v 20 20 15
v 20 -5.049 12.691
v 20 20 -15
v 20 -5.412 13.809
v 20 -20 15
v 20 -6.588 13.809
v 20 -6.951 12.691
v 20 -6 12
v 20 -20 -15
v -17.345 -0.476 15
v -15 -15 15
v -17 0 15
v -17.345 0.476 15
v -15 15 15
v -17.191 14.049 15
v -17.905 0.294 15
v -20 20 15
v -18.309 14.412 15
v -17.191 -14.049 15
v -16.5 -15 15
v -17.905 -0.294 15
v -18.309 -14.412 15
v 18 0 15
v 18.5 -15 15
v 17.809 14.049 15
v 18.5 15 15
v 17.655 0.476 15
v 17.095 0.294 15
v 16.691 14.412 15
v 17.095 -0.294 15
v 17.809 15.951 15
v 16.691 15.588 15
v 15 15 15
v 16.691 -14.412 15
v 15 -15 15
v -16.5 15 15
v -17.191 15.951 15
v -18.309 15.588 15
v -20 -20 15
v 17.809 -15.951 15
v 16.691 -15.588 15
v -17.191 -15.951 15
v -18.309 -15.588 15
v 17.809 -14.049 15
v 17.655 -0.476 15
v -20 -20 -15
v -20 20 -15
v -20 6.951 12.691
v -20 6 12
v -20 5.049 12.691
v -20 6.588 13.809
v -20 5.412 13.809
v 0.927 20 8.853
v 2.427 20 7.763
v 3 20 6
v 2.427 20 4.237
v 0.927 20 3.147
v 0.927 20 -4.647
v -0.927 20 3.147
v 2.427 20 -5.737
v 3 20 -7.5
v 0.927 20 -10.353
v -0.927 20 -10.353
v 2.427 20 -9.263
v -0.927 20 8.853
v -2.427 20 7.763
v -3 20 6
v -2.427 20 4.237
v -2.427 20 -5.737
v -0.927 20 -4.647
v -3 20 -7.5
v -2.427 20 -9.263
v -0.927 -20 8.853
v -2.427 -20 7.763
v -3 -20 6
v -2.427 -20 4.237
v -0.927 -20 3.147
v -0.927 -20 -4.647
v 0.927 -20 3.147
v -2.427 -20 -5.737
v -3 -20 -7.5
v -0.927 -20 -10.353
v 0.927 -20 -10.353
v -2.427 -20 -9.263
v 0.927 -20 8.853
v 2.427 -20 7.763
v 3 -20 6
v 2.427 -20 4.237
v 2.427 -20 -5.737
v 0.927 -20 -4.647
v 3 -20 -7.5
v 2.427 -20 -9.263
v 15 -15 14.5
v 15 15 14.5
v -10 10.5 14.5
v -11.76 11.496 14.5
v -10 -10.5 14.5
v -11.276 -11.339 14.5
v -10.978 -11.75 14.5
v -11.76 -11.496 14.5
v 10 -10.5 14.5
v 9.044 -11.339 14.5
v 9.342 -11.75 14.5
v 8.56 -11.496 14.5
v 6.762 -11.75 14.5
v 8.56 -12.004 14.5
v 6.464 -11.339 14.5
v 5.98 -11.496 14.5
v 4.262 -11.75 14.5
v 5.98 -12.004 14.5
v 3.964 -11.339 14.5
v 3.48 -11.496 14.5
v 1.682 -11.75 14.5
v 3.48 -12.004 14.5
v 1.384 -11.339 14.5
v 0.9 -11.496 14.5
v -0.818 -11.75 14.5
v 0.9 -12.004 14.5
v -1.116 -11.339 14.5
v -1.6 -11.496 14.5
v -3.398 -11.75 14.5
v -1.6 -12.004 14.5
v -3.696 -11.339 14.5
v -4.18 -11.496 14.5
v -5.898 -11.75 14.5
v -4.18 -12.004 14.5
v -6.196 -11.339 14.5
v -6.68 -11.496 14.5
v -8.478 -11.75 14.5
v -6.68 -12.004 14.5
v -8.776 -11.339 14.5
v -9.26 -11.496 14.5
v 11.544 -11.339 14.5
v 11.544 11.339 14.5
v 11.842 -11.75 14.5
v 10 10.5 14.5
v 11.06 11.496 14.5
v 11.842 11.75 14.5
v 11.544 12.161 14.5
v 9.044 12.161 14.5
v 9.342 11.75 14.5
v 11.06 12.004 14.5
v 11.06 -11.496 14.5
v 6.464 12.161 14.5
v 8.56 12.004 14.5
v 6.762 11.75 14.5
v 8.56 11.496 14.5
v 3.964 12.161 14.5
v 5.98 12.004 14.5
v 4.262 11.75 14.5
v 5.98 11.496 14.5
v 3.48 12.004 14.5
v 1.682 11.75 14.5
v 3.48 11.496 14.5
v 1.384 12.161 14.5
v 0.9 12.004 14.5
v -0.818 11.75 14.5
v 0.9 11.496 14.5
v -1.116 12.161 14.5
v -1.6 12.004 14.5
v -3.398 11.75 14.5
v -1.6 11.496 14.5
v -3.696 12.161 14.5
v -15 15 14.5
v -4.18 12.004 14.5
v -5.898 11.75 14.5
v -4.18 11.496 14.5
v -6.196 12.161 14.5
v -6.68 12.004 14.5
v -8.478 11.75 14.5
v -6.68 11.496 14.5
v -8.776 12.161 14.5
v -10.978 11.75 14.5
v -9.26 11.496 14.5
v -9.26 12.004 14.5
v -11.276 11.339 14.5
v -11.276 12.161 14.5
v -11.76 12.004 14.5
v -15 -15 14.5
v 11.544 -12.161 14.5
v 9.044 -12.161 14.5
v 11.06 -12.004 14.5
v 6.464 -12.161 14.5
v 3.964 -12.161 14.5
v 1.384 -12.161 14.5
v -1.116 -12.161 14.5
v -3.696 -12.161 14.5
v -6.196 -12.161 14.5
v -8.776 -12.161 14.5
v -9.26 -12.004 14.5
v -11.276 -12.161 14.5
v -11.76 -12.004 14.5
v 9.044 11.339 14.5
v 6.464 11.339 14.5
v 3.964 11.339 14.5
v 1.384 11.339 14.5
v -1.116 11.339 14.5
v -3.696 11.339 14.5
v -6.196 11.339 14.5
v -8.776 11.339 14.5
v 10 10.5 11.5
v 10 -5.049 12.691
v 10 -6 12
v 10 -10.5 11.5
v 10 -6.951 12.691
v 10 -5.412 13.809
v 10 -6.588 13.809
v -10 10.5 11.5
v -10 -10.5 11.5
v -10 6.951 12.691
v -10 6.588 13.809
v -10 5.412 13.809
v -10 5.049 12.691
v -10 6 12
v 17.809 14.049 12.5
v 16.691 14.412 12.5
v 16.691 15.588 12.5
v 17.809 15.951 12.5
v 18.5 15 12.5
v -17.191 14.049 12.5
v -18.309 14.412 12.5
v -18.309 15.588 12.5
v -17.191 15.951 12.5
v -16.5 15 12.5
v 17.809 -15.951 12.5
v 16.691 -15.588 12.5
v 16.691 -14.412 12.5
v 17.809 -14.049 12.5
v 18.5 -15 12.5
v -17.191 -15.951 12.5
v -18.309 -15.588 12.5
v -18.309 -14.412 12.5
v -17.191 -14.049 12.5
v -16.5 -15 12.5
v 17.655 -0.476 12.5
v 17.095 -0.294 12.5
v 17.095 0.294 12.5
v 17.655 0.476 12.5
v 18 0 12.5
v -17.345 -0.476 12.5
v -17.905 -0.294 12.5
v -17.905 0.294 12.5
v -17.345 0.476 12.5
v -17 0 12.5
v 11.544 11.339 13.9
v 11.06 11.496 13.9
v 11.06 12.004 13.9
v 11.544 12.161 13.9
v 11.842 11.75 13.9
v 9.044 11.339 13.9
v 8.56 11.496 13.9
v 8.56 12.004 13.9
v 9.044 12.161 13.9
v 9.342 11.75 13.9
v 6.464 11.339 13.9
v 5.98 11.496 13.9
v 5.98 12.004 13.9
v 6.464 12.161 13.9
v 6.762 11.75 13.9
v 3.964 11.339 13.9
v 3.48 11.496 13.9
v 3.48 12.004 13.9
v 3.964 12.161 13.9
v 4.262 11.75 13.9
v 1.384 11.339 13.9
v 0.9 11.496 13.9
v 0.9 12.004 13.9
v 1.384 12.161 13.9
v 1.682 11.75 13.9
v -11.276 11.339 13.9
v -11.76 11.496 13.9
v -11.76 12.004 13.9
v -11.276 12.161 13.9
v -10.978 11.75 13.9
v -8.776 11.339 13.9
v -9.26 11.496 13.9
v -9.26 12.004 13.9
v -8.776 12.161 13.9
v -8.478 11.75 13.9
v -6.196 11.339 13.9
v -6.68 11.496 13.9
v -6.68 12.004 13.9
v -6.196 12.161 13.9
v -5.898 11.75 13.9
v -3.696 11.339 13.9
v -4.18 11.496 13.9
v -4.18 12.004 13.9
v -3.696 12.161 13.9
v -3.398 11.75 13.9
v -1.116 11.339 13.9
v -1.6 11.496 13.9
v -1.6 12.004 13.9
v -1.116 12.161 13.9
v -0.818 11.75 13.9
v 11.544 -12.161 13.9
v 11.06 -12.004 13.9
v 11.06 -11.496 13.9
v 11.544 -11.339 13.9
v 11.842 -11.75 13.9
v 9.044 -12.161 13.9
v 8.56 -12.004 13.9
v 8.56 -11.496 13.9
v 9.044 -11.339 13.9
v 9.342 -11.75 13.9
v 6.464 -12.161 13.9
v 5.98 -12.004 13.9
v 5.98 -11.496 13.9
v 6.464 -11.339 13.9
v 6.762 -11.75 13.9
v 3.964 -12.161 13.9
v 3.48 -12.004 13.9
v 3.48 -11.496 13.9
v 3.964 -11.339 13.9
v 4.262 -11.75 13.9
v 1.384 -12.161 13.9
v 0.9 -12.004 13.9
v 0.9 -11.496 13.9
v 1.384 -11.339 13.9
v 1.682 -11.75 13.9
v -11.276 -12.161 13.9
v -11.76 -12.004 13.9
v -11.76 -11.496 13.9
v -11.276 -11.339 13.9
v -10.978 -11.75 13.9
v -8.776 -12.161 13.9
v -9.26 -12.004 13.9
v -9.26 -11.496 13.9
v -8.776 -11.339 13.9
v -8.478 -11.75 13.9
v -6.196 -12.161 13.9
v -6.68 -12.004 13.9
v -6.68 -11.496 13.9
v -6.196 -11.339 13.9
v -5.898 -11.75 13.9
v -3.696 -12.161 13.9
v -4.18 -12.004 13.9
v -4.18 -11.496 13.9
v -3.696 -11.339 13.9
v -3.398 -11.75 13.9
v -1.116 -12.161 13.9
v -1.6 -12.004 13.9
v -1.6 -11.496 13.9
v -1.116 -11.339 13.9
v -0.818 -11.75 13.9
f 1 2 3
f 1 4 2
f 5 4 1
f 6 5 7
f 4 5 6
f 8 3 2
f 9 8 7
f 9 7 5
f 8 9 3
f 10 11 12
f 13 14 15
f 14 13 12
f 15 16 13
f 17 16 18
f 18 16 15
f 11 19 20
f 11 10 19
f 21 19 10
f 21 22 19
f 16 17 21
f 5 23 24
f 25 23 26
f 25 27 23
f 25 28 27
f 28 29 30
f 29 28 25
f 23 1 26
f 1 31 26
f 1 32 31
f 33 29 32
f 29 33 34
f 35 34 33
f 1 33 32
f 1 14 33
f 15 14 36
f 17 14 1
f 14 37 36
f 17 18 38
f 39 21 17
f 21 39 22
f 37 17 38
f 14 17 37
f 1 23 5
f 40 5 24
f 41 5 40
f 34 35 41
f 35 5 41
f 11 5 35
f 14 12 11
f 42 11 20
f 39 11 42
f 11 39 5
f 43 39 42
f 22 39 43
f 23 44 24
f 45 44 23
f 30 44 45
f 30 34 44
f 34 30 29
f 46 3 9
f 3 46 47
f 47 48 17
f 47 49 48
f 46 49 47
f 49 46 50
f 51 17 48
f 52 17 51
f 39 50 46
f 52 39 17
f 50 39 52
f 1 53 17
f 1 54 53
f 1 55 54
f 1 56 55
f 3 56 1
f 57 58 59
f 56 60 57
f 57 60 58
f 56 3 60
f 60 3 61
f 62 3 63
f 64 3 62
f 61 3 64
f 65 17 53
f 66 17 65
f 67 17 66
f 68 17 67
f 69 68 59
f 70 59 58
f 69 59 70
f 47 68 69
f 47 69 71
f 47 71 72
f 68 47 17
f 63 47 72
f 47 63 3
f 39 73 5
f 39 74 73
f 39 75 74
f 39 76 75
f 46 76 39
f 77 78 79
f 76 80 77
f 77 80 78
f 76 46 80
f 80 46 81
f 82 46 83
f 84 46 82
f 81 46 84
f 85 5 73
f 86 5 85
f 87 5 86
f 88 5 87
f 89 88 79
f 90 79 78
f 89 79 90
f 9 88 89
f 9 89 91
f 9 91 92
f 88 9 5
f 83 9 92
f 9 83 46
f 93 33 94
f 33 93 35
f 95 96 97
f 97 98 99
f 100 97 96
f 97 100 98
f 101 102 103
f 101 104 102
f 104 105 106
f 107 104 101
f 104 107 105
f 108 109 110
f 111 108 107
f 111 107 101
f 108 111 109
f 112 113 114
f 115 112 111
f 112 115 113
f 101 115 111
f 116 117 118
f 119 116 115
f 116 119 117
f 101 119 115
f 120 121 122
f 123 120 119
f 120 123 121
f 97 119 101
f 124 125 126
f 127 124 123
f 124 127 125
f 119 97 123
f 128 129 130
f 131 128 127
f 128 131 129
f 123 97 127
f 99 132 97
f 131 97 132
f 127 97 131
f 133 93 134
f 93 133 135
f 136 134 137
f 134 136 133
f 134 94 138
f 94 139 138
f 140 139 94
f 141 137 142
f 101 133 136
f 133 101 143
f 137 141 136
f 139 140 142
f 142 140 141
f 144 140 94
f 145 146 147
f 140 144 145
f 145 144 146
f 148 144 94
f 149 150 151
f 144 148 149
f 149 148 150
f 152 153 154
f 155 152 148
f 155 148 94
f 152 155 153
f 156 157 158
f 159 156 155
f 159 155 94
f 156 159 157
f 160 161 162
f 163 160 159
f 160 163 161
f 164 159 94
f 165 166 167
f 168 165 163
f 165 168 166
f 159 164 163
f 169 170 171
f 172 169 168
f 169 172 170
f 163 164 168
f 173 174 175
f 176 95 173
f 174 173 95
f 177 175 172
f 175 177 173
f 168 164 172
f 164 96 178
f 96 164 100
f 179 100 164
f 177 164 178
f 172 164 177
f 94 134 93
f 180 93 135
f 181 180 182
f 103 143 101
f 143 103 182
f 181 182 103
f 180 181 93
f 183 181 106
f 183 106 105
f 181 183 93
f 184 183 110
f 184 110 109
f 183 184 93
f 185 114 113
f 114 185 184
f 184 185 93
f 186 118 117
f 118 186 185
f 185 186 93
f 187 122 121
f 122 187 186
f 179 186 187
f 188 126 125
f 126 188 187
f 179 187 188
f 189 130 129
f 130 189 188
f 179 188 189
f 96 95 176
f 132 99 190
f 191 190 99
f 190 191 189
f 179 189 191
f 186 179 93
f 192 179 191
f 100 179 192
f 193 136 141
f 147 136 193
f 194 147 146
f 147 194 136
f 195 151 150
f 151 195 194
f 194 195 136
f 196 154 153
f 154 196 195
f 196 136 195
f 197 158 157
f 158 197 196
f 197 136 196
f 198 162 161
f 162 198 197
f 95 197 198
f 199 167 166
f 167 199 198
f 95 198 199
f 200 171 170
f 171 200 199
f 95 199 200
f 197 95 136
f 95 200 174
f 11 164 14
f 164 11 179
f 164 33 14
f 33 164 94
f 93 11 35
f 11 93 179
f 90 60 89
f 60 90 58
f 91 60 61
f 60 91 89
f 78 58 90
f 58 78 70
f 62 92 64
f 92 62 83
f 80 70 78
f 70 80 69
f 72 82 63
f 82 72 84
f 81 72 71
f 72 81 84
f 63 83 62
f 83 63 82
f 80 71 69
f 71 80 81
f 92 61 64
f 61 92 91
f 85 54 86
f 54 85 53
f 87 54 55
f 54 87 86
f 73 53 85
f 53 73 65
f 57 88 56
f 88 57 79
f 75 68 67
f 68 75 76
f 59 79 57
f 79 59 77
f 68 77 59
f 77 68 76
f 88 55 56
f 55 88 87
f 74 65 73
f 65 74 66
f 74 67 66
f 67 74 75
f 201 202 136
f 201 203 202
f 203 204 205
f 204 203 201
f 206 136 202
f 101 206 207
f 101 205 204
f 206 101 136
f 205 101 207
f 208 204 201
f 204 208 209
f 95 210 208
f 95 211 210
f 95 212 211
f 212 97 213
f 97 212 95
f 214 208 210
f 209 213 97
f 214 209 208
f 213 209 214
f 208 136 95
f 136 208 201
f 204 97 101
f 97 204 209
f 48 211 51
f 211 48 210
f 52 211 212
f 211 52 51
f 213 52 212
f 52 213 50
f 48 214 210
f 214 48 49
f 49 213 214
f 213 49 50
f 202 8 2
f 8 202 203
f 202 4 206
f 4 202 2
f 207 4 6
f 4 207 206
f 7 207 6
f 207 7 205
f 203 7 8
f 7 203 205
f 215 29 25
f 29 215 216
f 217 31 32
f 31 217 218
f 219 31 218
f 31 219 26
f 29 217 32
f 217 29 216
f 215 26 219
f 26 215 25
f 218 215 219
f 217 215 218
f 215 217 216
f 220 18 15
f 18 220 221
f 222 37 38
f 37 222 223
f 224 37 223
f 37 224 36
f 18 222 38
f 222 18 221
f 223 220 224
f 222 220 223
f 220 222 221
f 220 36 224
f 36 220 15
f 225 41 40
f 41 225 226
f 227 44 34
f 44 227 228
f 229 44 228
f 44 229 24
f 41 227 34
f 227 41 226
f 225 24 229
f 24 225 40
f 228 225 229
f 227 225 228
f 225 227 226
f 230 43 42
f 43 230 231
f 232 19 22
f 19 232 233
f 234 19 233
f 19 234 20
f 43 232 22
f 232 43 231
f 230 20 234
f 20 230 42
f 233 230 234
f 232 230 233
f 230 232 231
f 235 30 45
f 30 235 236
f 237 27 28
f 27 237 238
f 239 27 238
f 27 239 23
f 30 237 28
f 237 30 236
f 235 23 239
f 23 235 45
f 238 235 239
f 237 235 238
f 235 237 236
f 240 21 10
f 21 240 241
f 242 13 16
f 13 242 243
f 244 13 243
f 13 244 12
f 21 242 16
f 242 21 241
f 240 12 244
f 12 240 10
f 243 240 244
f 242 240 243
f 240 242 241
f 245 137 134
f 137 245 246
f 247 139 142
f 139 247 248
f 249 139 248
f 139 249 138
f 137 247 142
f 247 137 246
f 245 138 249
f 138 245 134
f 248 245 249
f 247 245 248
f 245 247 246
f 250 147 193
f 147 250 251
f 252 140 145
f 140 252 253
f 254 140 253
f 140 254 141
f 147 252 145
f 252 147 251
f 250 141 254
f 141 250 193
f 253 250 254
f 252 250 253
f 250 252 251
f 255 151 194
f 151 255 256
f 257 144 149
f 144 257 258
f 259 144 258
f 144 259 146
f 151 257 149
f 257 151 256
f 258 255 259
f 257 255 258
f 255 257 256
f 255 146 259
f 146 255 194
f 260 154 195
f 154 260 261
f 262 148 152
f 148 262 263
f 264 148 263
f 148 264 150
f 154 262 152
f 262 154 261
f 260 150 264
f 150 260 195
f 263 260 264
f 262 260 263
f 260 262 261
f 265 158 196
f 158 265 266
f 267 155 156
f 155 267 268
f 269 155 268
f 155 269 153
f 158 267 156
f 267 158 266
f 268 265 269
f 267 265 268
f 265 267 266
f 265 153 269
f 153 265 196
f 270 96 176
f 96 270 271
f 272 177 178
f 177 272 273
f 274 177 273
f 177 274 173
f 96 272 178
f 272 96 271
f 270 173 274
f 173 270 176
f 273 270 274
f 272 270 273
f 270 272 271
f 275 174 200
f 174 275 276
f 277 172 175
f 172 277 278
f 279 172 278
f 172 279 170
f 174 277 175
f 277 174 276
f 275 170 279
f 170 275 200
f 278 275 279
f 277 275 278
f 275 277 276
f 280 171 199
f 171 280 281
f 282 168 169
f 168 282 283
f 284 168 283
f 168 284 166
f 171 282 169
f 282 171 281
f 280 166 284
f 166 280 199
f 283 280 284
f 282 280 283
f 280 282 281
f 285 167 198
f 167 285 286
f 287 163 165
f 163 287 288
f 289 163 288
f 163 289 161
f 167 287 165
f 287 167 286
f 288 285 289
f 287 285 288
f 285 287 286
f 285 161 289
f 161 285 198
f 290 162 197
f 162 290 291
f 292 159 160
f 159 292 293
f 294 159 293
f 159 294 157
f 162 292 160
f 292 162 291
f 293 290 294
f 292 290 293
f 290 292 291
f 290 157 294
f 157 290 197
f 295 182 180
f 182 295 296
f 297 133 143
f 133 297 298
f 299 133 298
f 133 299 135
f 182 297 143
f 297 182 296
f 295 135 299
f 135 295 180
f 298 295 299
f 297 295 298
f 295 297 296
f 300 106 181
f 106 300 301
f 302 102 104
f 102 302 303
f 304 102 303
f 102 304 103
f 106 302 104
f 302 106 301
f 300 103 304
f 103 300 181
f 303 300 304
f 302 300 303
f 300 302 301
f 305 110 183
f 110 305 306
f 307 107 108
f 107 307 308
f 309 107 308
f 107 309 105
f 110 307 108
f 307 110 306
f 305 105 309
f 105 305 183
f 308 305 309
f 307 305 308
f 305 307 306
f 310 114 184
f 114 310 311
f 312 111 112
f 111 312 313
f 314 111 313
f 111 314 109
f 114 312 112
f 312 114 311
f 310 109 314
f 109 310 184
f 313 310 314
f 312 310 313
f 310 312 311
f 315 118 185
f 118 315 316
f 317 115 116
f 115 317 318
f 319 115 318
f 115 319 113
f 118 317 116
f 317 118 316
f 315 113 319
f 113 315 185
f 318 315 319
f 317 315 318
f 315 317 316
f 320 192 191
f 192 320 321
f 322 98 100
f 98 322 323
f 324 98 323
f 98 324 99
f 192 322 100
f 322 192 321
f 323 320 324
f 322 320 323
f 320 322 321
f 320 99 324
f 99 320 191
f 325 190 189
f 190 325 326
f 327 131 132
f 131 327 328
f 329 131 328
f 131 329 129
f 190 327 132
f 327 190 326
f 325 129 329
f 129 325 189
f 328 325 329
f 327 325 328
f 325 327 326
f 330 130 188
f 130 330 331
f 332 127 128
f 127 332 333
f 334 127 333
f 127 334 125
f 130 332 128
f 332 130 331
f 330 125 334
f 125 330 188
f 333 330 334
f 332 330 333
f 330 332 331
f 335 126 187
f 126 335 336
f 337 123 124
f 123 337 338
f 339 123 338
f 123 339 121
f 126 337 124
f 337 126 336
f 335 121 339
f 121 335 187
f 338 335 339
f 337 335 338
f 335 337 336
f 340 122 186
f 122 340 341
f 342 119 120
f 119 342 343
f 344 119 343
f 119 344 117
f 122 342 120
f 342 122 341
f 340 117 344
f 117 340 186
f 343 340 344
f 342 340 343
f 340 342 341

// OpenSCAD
//Substrate holder v2


module substrate_holder(x1,y1,z1, s_d)
{
    
    //substrate dimensions
    x=30;
    y=30;
    z=1.1;
    d=0.8641;
    
    //negative y
    difference(){
    difference(){
    difference(){
    difference(){
    difference(){
    difference(){
    difference(){
    difference(){
    difference(){
    difference(){
       // positive y 
    difference(){
    difference(){
    difference(){
    difference(){
    difference(){
    difference(){
    difference(){
    difference(){
    difference(){
    difference(){
    
    //negative y
    //difference(){
    //difference(){
    //difference(){
    //difference(){
    //difference(){
    //difference(){
    //difference(){
    //difference(){
    //difference(){
    //difference(){
       // positive y 
    //difference(){
    //difference(){
    //difference(){
    //difference(){
    //difference(){
    //difference(){
    //difference(){
    //difference(){
    //difference(){
    //difference(){
        
        //components
            
            difference(){
            difference(){
            difference(){
            difference(){
            difference(){
            difference(){
            difference(){
            difference(){
            difference(){
            difference(){
            difference(){
            difference(){
            //difference(){
        cube ([x1,y1,z1], center = true);
        
        //substrate outline
        translate([0,0,z1/2]) 
        cube([x,y,1], center = true);}
            // cartridge heater
                translate([0,0,-z1/4])
                rotate([90,0,0])
                cylinder(r=3, h=x1+1, center = true);}
                
             // temp sensor
                translate([0,0,6])
                rotate([90,0,0])
                cylinder(r=3, h=x1+1, center = true);} 
             // air flow 
              
              translate([0,0,z1/2])
              cube([x-10,y-9,7], center =true);}
              
              translate([-15,6,z1/2-2])
              rotate([0,90,0])
              cylinder(r=1, h=x1+1, center = true);}
              
              translate([15,-6,z1/2-2])
              rotate([0,90,0])
              cylinder(r=1, h=x1+1, center = true);}
             
              
                
            
                
             //bracket
             translate([17.5,y/2,z1/2])
             cylinder(r=1, h=5, center =true);}
             
             translate([-17.5,y/2,z1/2])
             cylinder(r=1, h=5, center =true);}
             
             translate([17.5,-(y/2),z1/2])
             cylinder(r=1, h=5, center =true);}
             
             translate([-17.5,-(y/2),z1/2])
             cylinder(r=1, h=5, center =true);}
             
             //bracket guide pins
             translate([17.5,0,z1/2])
             cylinder(r=0.5, h=5, center =true);}
             translate([-17.5,0,z1/2])
             cylinder(r=0.5, h=5, center =true);}
             
                
                
                
                // gap for heater
                //translate([0,0,0])
                //rotate([0,0,0])
                //cylinder(r=8, h=x1+1, center = true);} 
              
        //sideways oriented holes        
        // positive y posiitve x   
////        translate([x/2-3.59,y/2+1,z1/2])
////             rotate([90,0,0])
////        cylinder(r=d/2, h=9, center =true);}
////        
////        translate([x/2-6.09,y/2+1,z1/2])
////         rotate([90,0,0])
////        cylinder(r=d/2, h=9, center =true);}
////        
////          translate([x/2-8.67,y/2+1,z1/2])
////         rotate([90,0,0])
////        cylinder(r=d/2, h=9, center =true);}
////        
////        translate([x/2-11.17,y/2+1,z1/2])
////         rotate([90,0,0])
////        cylinder(r=d/2, h=9, center =true);}
////        
////        translate([x/2-13.75,y/2+1,z1/2])
////         rotate([90,0,0])
////        cylinder(r=d/2, h=9, center =true);}
////        
////        //positive y negative x
////        translate([-(x/2-3.59),y/2+1,z1/2])
////         rotate([90,0,0])
////        cylinder(r=d/2, h=9, center =true);}
////        
////        translate([-(x/2-6.09),y/2+1,z1/2])
////         rotate([90,0,0])
////        cylinder(r=d/2, h=9, center =true);}
////        
////          translate([-(x/2-8.67),y/2+1,z1/2])
////         rotate([90,0,0])
////        cylinder(r=d/2, h=9, center =true);}
////        
////        translate([-(x/2-11.17),y/2+1,z1/2])
////         rotate([90,0,0])
////        cylinder(r=d/2, h=9, center =true);}
////        
////        translate([-(x/2-13.75),y/2+1,z1/2])
////         rotate([90,0,0])
////        cylinder(r=d/2, h=9, center =true);}
////        
////         // negative y positve x   
////        translate([x/2-3.59,-(y/2+1),z1/2])
////         rotate([90,0,0])
////        cylinder(r=d/2, h=9, center =true);}
////        
////        translate([x/2-6.09,-(y/2+1),z1/2])
////         rotate([90,0,0])
////        cylinder(r=d/2, h=9, center =true);}
////        
////          translate([x/2-8.67,-(y/2+1),z1/2])
////         rotate([90,0,0])
////        cylinder(r=d/2, h=9, center =true);}
////        
////        translate([x/2-11.17,-(y/2+1),z1/2])
////         rotate([90,0,0])
////        cylinder(r=d/2, h=9, center =true);}
////        
////        translate([x/2-13.75,-(y/2+1),z1/2])
////         rotate([90,0,0])
////        cylinder(r=d/2, h=9, center =true);}
////        
////        //negative y negative x
////        translate([-(x/2-3.59),-(y/2+1),z1/2])
////         rotate([90,0,0])
////        cylinder(r=d/2, h=9, center =true);}
////        
////        translate([-(x/2-6.09),-(y/2+1),z1/2])
////         rotate([90,0,0])
////        cylinder(r=d/2, h=9, center =true);}
////        
////          translate([-(x/2-8.67),-(y/2+1),z1/2])
////         rotate([90,0,0])
////        cylinder(r=d/2, h=9, center =true);}
////        
////        translate([-(x/2-11.17),-(y/2+1),z1/2])
////         rotate([90,0,0])
////        cylinder(r=d/2, h=9, center =true);}
////        
////        translate([-(x/2-13.75),-(y/2+1),z1/2])
////         rotate([90,0,0])
////        cylinder(r=d/2, h=9, center =true);}
    
    
        
//Vertical oriented holes        
         // positive y posiitve x   
        translate([x/2-3.59,y/2-3.25,z1/2])
        cylinder(r=d/2, h=z+1.1, center =true);}
        
        translate([x/2-6.09,y/2-3.25,z1/2])
        cylinder(r=d/2, h=z+1.1, center =true);}
        
          translate([x/2-8.67,y/2-3.25,z1/2])
        cylinder(r=d/2, h=z+1.1, center =true);}
        
        translate([x/2-11.17,y/2-3.25,z1/2])
        cylinder(r=d/2, h=z+1.1, center =true);}
        
        translate([x/2-13.75,y/2-3.25,z1/2])
        cylinder(r=d/2, h=z+1.1, center =true);}
        
        //positive y negative x
        translate([-(x/2-3.59),y/2-3.25,z1/2])
        cylinder(r=d/2, h=z+1.1, center =true);}
        
        translate([-(x/2-6.09),y/2-3.25,z1/2])
        cylinder(r=d/2, h=z+1.1, center =true);}
        
          translate([-(x/2-8.67),y/2-3.25,z1/2])
        cylinder(r=d/2, h=z+1.1, center =true);}
        
        translate([-(x/2-11.17),y/2-3.25,z1/2])
        cylinder(r=d/2, h=z+1.1, center =true);}
        
        translate([-(x/2-13.75),y/2-3.25,z1/2])
        cylinder(r=d/2, h=z+1.1, center =true);}
        
         // negative y positve x   
        translate([x/2-3.59,-(y/2-3.25),z1/2])
        cylinder(r=d/2, h=z+1.1, center =true);}
        
        translate([x/2-6.09,-(y/2-3.25),z1/2])
        cylinder(r=d/2, h=z+1.1, center =true);}
        
          translate([x/2-8.67,-(y/2-3.25),z1/2])
        cylinder(r=d/2, h=z+1.1, center =true);}
        
        translate([x/2-11.17,-(y/2-3.25),z1/2])
        cylinder(r=d/2, h=z+1.1, center =true);}
        
        translate([x/2-13.75,-(y/2-3.25),z1/2])
        cylinder(r=d/2, h=z+1.1, center =true);}
        
        //negative y negative x
        translate([-(x/2-3.59),-(y/2-3.25),z1/2])
        cylinder(r=d/2, h=z+1.1, center =true);}
        
        translate([-(x/2-6.09),-(y/2-3.25),z1/2])
        cylinder(r=d/2, h=z+1.1, center =true);}
        
          translate([-(x/2-8.67),-(y/2-3.25),z1/2])
        cylinder(r=d/2, h=z+1.1, center =true);}
        
        translate([-(x/2-11.17),-(y/2-3.25),z1/2])
        cylinder(r=d/2, h=z+1.1, center =true);}
        
        translate([-(x/2-13.75),-(y/2-3.25),z1/2])
        cylinder(r=d/2, h=z+1.1, center =true);}
    
    
    
    
    
    
    
    
    
    
    
    
    
    
    
    
    
    
    
    
    }

    substrate_holder(40,40,30);
